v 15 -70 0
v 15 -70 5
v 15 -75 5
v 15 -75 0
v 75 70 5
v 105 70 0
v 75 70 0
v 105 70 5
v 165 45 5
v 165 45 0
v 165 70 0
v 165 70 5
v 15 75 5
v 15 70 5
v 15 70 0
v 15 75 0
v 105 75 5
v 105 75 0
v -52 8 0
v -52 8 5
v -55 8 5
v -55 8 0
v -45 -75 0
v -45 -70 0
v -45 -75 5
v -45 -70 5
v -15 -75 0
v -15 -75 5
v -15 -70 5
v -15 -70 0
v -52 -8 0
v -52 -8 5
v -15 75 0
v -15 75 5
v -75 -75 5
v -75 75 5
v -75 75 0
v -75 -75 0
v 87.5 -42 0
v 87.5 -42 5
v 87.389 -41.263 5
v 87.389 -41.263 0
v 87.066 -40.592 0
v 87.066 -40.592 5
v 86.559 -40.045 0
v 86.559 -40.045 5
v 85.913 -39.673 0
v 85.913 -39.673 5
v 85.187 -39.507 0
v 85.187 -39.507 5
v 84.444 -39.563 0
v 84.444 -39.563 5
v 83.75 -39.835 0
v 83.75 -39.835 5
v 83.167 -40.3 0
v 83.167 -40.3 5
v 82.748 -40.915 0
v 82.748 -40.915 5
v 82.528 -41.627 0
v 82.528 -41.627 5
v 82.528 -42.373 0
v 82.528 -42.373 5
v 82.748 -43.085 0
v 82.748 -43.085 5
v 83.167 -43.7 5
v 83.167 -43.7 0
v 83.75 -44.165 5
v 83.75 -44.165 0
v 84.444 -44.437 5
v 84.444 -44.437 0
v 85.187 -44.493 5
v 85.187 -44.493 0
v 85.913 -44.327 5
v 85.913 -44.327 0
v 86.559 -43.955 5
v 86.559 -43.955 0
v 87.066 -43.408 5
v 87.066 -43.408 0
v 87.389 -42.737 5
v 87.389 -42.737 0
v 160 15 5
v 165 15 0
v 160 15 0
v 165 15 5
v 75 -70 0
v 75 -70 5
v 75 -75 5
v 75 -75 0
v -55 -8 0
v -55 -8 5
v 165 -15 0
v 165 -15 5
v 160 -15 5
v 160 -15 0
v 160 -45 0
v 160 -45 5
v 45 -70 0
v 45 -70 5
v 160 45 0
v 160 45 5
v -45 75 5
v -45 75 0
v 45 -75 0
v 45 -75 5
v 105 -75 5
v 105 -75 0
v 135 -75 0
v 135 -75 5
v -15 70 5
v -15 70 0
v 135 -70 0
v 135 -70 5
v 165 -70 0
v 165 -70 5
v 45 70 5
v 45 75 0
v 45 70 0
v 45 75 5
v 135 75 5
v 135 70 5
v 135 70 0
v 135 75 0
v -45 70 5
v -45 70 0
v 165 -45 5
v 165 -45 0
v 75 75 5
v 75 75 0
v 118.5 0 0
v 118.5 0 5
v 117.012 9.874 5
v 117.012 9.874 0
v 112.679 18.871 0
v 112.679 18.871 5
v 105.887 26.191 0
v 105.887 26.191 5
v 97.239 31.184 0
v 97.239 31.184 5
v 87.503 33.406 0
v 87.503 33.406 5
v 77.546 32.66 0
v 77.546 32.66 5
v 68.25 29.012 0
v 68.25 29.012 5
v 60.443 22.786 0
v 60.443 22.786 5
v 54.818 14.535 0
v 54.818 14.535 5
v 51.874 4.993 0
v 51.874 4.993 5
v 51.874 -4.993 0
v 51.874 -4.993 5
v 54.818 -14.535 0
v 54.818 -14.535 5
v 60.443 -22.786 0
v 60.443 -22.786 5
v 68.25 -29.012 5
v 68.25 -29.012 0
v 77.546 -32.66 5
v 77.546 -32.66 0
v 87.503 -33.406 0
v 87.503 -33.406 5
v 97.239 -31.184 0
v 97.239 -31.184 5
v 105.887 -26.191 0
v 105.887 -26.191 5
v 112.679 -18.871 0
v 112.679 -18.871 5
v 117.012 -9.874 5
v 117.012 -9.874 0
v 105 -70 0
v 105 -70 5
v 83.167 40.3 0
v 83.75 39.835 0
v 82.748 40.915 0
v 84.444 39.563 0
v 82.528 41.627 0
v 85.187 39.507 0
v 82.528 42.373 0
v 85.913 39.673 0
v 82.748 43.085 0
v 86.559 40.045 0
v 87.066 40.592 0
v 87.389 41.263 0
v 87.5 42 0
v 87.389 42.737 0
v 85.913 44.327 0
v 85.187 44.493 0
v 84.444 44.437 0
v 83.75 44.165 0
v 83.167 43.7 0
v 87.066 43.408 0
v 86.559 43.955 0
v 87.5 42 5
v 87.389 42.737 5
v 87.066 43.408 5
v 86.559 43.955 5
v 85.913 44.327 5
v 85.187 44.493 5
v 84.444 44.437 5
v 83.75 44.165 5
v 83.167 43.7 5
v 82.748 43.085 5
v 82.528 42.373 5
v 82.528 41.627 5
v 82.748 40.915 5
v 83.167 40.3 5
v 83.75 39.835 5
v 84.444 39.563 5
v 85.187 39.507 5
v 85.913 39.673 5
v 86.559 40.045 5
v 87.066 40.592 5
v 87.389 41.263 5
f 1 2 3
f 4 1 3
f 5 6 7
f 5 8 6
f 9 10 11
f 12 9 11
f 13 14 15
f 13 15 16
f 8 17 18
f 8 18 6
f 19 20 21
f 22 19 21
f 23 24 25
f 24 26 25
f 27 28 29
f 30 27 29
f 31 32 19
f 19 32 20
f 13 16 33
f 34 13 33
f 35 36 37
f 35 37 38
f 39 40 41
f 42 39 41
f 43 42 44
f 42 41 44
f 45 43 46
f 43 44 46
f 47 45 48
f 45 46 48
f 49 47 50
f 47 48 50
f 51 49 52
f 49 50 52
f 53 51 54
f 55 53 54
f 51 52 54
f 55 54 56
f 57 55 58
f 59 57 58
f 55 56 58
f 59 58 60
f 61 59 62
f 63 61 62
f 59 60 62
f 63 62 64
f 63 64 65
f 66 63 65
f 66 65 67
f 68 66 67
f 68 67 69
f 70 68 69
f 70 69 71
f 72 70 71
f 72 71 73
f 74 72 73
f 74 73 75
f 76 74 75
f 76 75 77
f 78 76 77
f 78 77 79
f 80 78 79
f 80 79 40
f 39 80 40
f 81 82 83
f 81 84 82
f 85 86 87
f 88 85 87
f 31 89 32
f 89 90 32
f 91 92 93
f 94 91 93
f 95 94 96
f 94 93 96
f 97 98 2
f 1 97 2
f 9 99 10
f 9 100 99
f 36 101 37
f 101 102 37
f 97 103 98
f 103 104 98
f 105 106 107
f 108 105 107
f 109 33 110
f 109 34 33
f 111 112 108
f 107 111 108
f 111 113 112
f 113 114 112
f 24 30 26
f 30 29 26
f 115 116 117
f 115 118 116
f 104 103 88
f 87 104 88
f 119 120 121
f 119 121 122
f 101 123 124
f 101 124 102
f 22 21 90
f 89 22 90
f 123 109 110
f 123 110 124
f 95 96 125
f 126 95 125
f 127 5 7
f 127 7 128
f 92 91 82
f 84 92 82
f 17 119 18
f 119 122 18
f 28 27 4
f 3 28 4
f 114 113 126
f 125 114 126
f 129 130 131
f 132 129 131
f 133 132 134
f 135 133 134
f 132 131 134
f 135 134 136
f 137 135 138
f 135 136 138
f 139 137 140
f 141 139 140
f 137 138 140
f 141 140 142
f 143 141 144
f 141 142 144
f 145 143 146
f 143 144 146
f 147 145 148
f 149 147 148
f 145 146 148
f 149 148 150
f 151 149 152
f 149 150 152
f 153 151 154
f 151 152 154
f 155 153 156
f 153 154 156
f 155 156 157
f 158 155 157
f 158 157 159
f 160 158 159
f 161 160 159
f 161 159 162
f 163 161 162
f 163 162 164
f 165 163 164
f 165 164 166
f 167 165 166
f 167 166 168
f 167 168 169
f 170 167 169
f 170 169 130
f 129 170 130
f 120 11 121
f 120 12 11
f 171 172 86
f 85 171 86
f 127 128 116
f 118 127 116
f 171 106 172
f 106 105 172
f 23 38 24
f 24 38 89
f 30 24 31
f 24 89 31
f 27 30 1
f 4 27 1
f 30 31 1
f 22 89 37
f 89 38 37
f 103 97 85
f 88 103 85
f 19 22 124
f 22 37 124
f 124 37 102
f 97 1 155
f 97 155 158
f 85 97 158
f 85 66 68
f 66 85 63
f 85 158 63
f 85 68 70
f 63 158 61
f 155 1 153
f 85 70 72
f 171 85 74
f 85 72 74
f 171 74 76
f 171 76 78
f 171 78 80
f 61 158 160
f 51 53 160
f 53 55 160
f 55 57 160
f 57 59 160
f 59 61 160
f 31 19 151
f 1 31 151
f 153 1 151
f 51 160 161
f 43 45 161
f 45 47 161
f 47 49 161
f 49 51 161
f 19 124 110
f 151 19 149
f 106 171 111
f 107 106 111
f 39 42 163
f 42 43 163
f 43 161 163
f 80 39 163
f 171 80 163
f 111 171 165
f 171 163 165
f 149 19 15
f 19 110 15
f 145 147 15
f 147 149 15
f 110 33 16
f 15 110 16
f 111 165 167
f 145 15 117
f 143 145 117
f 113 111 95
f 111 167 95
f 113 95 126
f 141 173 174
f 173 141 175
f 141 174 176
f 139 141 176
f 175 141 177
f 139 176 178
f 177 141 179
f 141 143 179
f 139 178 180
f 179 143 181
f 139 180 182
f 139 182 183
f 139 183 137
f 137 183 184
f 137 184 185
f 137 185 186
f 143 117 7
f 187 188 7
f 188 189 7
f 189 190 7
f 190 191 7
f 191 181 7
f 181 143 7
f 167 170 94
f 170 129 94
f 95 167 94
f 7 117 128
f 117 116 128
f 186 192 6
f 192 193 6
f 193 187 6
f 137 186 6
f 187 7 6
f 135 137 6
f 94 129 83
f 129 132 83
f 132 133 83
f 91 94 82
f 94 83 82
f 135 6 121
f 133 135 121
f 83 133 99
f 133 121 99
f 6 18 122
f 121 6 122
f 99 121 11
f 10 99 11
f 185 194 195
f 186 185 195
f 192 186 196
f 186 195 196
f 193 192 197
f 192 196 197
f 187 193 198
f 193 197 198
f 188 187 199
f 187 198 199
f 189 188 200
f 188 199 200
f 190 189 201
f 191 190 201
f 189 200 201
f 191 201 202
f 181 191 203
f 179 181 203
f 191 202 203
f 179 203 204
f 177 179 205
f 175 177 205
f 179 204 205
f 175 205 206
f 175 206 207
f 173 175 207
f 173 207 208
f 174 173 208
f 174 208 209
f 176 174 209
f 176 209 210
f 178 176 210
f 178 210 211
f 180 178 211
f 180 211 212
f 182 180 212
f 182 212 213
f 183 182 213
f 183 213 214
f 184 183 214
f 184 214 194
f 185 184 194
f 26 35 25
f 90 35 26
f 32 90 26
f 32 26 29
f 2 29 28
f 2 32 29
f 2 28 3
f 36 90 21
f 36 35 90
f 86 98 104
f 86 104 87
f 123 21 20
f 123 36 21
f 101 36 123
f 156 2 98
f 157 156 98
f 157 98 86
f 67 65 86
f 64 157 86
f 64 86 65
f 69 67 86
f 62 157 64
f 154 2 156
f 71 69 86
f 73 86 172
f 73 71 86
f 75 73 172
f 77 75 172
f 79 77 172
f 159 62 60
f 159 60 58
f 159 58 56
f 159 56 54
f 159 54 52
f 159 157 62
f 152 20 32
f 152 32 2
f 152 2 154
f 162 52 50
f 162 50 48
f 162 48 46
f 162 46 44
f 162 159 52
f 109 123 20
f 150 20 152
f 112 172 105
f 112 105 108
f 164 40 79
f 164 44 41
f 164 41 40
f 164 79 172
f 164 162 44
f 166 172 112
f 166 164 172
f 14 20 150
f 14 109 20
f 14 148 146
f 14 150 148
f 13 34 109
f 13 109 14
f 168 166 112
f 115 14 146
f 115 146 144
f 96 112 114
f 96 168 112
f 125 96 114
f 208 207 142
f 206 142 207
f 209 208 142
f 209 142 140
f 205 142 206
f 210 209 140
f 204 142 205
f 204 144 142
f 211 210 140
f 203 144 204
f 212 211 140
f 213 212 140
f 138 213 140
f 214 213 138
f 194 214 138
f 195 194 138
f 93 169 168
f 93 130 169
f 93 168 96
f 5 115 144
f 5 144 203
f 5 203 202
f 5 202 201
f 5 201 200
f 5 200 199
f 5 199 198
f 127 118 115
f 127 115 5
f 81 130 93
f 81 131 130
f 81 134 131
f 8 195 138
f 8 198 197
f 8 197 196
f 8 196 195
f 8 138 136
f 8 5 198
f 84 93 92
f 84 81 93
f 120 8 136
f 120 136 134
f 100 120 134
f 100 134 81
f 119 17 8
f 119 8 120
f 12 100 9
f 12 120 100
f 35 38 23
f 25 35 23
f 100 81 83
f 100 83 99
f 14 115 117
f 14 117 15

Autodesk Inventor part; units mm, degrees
ref_plane "YZ Plane" through (0, 0, 0) normal (1, 0, 0) x (0, 1, 0)
ref_plane "XZ Plane" through (0, 0, 0) normal (0, 1, 0) x (-1, 0, 0)
ref_plane "XY Plane" through (0, 0, 0) normal (0, 0, 1) x (1, 0, 0)
sketch "Sketch1" plane through (0, 0, 0) normal (0, 0, 1) x (1, 0, 0)
  line L0 (0, 2.8582) -> (0, -2.8582) construction
  line L1 (-5.7775, 0) -> (5.7775, 0) construction
  line L2 (-165, -75) -> (165, -75)
  line L3 (165, -75) -> (165, 75)
  line L4 (165, 75) -> (-165, 75)
  line L5 (-165, 75) -> (-165, -75)
  line L6 (-165, -75) -> (165, 75) construction
  line L7 (165, -75) -> (-165, 75) construction
  point P0 (0, 0)
  point P1 (0, 0)
  dimension "d0" = 330
  dimension "d1" = 150
extrude "Extrusion1" add sketch "Sketch1" along normal blind 5
sketch "Sketch2" plane through (0, 0, 5) normal (0, 0, 1) x (1, 0, 0)
  line L0 (0, 0) -> (-130, 0)
  circle A0 centre (-130, 0) radius 5
  line L1 (-165, 75) -> (-165, -75) projected
  line L2 (-165, 0) -> (-165, 15)
  line L3 (-165, 15) -> (-165, -15)
  line L4 (-165, -15) -> (-165, -45)
  line L5 (-165, -45) -> (-165, -75)
  line L6 (-165, 15) -> (-165, 45)
  line L7 (-165, 45) -> (-165, 75)
  line L8 (-165, 15) -> (-160, 15)
  line L9 (-160, 15) -> (-160, 45)
  line L10 (-160, 45) -> (-165, 45)
  line L11 (-165, 45) -> (-165, 15)
  line L12 (-165, -15) -> (-160, -15)
  line L13 (-160, -15) -> (-160, -45)
  line L14 (-160, -45) -> (-165, -45)
  line L15 (-165, -45) -> (-165, -15)
  line L16 (-165, -75) -> (165, -75) projected
  line L17 (-165, -75) -> (-135, -75)
  line L18 (-135, -75) -> (-105, -75)
  line L19 (-105, -75) -> (-75, -75)
  line L20 (-75, -75) -> (-45, -75)
  line L21 (-45, -75) -> (-15, -75)
  line L22 (-15, -75) -> (15, -75)
  line L23 (15, -75) -> (45, -75)
  line L24 (45, -75) -> (75, -75)
  line L25 (75, -75) -> (105, -75)
  line L26 (105, -75) -> (135, -75)
  line L27 (135, -75) -> (165, -75)
  line L28 (-165, -75) -> (-135, -75)
  line L29 (-135, -75) -> (-135, -70)
  line L30 (-135, -70) -> (-165, -70)
  line L31 (-165, -70) -> (-165, -75)
  line L32 (-105, -75) -> (-75, -75)
  line L33 (-75, -75) -> (-75, -70)
  line L34 (-75, -70) -> (-105, -70)
  line L35 (-105, -70) -> (-105, -75)
  line L36 (-45, -75) -> (-15, -75)
  line L37 (-15, -75) -> (-15, -70)
  line L38 (-15, -70) -> (-45, -70)
  line L39 (-45, -70) -> (-45, -75)
  line L40 (15, -75) -> (45, -75)
  line L41 (45, -75) -> (45, -70)
  line L42 (45, -70) -> (15, -70)
  line L43 (15, -70) -> (15, -75)
  line L44 (75, -75) -> (105, -75)
  line L45 (105, -75) -> (105, -70)
  line L46 (105, -70) -> (75, -70)
  line L47 (75, -70) -> (75, -75)
  line L48 (135, -75) -> (165, -75)
  line L49 (165, -75) -> (165, -70)
  line L50 (165, -70) -> (135, -70)
  line L51 (135, -70) -> (135, -75)
  line L52 (165, 75) -> (-165, 75) projected
  line L53 (-165, 75) -> (-135, 75)
  line L54 (-135, 75) -> (-135, 70)
  line L55 (-135, 70) -> (-165, 70)
  line L56 (-165, 70) -> (-165, 75)
  line L57 (-105, 75) -> (-75, 75)
  line L58 (-75, 75) -> (-75, 70)
  line L59 (-75, 70) -> (-105, 70)
  line L60 (-105, 70) -> (-105, 75)
  line L61 (-45, 75) -> (-15, 75)
  line L62 (-15, 75) -> (-15, 70)
  line L63 (-15, 70) -> (-45, 70)
  line L64 (-45, 70) -> (-45, 75)
  line L65 (15, 75) -> (45, 75)
  line L66 (45, 75) -> (45, 70)
  line L67 (45, 70) -> (15, 70)
  line L68 (15, 70) -> (15, 75)
  line L69 (75, 75) -> (105, 75)
  line L70 (105, 75) -> (105, 70)
  line L71 (105, 70) -> (75, 70)
  line L72 (75, 70) -> (75, 75)
  line L73 (165, -75) -> (165, 75) projected
  line L74 (135, 75) -> (165, 75)
  line L75 (165, 75) -> (165, 70)
  line L76 (165, 70) -> (135, 70)
  line L77 (135, 70) -> (135, 75)
  line L78 (165, 0) -> (165, 15)
  line L79 (165, 15) -> (160, 15)
  line L80 (160, 15) -> (160, 45)
  line L81 (160, 45) -> (165, 45)
  line L82 (165, 45) -> (165, 15)
  line L83 (165, -15) -> (160, -15)
  line L84 (160, -15) -> (160, -45)
  line L85 (160, -45) -> (165, -45)
  line L86 (165, -45) -> (165, -15)
  point P0 (-165, -70)
  point P1 (135, 75)
  point P2 (105, 75)
  point P3 (75, 75)
  point P4 (45, 75)
  point P5 (15, 75)
  point P6 (-15, 75)
  point P7 (-165, 70)
  point P8 (-165, -45)
  dimension "d4" = 130
  dimension "d5" = 10
  dimension "d6" = 15
  dimension "d7" = 30
  dimension "d8" = 30
  dimension "d9" = 30
  dimension "d10" = 30
  dimension "d11" = 30
  dimension "d12" = 5
  dimension "d13" = 30
  dimension "d14" = 30
  dimension "d15" = 30
  dimension "d16" = 30
  dimension "d17" = 30
  dimension "d18" = 30
  dimension "d19" = 30
  dimension "d20" = 30
  dimension "d21" = 30
  dimension "d22" = 30
  dimension "d23" = 30
  dimension "d24" = 5
  dimension "d25" = 5
  dimension "d26" = 5
  dimension "d29" = 30
  dimension "d30" = 30
  dimension "d31" = 30
  dimension "d32" = 30
  dimension "d33" = 30
  dimension "d34" = 30
extrude "Extrusion2" cut sketch "Sketch2" against normal blind 8 contours A0 | L52 L54 L55 L1 | L10 L9 L8 L1 | L52 L58 L59 L60 | L52 L62 L63 L64 | L12 L13 L14 L1 | L52 L66 L67 L68 | L30 L29 L16 L1 | L52 L70 L71 L72 | L35 L34 L33 L16 | L52 L73 L76 L77 | L39 L38 L37 L16 | L73 L79 L80 L81 | L43 L42 L41 L16 | L47 L46 L45 L16 | L73 L85 L84 L83 | L51 L50 L49 L16
sketch "Sketch3" plane through (0, 0, 5) normal (0, 0, 1) x (1, 0, 0)
  line L0 (165, -15) -> (165, 15) projected
  line L1 (165, 0) -> (85, 0)
  circle A0 centre (85, 0) radius 33.5
  point P0 (0, 0)
  dimension "d35" = 80
  dimension "d36" = 67
extrude "Extrusion3" cut sketch "Sketch3" against normal blind 10
sketch "Sketch4" plane through (0, 0, 5) normal (0, 0, 1) x (1, 0, 0)
  circle A0 centre (85, 0) radius 33.5 projected
  line L0 (85, 0) -> (85, 42)
  circle A1 centre (85, 42) radius 2.5
  line L1 (85, 0) -> (85, -42)
  circle A2 centre (85, -42) radius 2.5
  point P0 (0, 0)
  dimension "d39" = 42
  dimension "d40" = 5
  dimension "d41" = 42
  dimension "d42" = 5
extrude "Extrusion4" cut sketch "Sketch4" against normal blind 5 contours A2 | A1
sketch "Sketch5" plane through (0, 0, 5) normal (0, 0, 1) x (1, 0, 0)
  line L0 (165, -70) -> (135, -70) projected
  line L1 (165, -70) -> (-75, -70)
  line L2 (-75, -75) -> (-45, -75) projected
  line L3 (-75, -75) -> (-184.16, -75)
  line L4 (-184.16, -75) -> (-184.16, 77.2339)
  line L5 (-184.16, 77.2339) -> (-75, 77.2339)
  line L6 (-75, 77.2339) -> (-75, -75)
  point P0 (0, 0)
  dimension "d45" = 240
extrude "Extrusion5" cut sketch "Sketch5" against normal blind 5
sketch "Sketch6" plane through (0, 0, 5) normal (0, 0, 1) x (1, 0, 0)
  line L0 (-75, 75) -> (-75, -75) projected
  line L1 (-75, 0) -> (-55, 0)
  line L2 (-55, 0) -> (-52, 0)
  line L3 (-55, -8) -> (-52, -8)
  line L4 (-52, -8) -> (-52, 8)
  line L5 (-52, 8) -> (-55, 8)
  line L6 (-55, 8) -> (-55, -8)
  line L7 (-55, -8) -> (-52, 8) construction
  line L8 (-52, -8) -> (-55, 8) construction
  point P0 (0, 0)
  point P1 (-53.5, 0)
  dimension "d25" = 5
  dimension "d48" = 20
  dimension "d49" = 3
  dimension "d50" = 3
  dimension "d51" = 16
extrude "Extrusion6" cut sketch "Sketch6" against normal blind 10
properties part number "Plaat boven" material "S235"
